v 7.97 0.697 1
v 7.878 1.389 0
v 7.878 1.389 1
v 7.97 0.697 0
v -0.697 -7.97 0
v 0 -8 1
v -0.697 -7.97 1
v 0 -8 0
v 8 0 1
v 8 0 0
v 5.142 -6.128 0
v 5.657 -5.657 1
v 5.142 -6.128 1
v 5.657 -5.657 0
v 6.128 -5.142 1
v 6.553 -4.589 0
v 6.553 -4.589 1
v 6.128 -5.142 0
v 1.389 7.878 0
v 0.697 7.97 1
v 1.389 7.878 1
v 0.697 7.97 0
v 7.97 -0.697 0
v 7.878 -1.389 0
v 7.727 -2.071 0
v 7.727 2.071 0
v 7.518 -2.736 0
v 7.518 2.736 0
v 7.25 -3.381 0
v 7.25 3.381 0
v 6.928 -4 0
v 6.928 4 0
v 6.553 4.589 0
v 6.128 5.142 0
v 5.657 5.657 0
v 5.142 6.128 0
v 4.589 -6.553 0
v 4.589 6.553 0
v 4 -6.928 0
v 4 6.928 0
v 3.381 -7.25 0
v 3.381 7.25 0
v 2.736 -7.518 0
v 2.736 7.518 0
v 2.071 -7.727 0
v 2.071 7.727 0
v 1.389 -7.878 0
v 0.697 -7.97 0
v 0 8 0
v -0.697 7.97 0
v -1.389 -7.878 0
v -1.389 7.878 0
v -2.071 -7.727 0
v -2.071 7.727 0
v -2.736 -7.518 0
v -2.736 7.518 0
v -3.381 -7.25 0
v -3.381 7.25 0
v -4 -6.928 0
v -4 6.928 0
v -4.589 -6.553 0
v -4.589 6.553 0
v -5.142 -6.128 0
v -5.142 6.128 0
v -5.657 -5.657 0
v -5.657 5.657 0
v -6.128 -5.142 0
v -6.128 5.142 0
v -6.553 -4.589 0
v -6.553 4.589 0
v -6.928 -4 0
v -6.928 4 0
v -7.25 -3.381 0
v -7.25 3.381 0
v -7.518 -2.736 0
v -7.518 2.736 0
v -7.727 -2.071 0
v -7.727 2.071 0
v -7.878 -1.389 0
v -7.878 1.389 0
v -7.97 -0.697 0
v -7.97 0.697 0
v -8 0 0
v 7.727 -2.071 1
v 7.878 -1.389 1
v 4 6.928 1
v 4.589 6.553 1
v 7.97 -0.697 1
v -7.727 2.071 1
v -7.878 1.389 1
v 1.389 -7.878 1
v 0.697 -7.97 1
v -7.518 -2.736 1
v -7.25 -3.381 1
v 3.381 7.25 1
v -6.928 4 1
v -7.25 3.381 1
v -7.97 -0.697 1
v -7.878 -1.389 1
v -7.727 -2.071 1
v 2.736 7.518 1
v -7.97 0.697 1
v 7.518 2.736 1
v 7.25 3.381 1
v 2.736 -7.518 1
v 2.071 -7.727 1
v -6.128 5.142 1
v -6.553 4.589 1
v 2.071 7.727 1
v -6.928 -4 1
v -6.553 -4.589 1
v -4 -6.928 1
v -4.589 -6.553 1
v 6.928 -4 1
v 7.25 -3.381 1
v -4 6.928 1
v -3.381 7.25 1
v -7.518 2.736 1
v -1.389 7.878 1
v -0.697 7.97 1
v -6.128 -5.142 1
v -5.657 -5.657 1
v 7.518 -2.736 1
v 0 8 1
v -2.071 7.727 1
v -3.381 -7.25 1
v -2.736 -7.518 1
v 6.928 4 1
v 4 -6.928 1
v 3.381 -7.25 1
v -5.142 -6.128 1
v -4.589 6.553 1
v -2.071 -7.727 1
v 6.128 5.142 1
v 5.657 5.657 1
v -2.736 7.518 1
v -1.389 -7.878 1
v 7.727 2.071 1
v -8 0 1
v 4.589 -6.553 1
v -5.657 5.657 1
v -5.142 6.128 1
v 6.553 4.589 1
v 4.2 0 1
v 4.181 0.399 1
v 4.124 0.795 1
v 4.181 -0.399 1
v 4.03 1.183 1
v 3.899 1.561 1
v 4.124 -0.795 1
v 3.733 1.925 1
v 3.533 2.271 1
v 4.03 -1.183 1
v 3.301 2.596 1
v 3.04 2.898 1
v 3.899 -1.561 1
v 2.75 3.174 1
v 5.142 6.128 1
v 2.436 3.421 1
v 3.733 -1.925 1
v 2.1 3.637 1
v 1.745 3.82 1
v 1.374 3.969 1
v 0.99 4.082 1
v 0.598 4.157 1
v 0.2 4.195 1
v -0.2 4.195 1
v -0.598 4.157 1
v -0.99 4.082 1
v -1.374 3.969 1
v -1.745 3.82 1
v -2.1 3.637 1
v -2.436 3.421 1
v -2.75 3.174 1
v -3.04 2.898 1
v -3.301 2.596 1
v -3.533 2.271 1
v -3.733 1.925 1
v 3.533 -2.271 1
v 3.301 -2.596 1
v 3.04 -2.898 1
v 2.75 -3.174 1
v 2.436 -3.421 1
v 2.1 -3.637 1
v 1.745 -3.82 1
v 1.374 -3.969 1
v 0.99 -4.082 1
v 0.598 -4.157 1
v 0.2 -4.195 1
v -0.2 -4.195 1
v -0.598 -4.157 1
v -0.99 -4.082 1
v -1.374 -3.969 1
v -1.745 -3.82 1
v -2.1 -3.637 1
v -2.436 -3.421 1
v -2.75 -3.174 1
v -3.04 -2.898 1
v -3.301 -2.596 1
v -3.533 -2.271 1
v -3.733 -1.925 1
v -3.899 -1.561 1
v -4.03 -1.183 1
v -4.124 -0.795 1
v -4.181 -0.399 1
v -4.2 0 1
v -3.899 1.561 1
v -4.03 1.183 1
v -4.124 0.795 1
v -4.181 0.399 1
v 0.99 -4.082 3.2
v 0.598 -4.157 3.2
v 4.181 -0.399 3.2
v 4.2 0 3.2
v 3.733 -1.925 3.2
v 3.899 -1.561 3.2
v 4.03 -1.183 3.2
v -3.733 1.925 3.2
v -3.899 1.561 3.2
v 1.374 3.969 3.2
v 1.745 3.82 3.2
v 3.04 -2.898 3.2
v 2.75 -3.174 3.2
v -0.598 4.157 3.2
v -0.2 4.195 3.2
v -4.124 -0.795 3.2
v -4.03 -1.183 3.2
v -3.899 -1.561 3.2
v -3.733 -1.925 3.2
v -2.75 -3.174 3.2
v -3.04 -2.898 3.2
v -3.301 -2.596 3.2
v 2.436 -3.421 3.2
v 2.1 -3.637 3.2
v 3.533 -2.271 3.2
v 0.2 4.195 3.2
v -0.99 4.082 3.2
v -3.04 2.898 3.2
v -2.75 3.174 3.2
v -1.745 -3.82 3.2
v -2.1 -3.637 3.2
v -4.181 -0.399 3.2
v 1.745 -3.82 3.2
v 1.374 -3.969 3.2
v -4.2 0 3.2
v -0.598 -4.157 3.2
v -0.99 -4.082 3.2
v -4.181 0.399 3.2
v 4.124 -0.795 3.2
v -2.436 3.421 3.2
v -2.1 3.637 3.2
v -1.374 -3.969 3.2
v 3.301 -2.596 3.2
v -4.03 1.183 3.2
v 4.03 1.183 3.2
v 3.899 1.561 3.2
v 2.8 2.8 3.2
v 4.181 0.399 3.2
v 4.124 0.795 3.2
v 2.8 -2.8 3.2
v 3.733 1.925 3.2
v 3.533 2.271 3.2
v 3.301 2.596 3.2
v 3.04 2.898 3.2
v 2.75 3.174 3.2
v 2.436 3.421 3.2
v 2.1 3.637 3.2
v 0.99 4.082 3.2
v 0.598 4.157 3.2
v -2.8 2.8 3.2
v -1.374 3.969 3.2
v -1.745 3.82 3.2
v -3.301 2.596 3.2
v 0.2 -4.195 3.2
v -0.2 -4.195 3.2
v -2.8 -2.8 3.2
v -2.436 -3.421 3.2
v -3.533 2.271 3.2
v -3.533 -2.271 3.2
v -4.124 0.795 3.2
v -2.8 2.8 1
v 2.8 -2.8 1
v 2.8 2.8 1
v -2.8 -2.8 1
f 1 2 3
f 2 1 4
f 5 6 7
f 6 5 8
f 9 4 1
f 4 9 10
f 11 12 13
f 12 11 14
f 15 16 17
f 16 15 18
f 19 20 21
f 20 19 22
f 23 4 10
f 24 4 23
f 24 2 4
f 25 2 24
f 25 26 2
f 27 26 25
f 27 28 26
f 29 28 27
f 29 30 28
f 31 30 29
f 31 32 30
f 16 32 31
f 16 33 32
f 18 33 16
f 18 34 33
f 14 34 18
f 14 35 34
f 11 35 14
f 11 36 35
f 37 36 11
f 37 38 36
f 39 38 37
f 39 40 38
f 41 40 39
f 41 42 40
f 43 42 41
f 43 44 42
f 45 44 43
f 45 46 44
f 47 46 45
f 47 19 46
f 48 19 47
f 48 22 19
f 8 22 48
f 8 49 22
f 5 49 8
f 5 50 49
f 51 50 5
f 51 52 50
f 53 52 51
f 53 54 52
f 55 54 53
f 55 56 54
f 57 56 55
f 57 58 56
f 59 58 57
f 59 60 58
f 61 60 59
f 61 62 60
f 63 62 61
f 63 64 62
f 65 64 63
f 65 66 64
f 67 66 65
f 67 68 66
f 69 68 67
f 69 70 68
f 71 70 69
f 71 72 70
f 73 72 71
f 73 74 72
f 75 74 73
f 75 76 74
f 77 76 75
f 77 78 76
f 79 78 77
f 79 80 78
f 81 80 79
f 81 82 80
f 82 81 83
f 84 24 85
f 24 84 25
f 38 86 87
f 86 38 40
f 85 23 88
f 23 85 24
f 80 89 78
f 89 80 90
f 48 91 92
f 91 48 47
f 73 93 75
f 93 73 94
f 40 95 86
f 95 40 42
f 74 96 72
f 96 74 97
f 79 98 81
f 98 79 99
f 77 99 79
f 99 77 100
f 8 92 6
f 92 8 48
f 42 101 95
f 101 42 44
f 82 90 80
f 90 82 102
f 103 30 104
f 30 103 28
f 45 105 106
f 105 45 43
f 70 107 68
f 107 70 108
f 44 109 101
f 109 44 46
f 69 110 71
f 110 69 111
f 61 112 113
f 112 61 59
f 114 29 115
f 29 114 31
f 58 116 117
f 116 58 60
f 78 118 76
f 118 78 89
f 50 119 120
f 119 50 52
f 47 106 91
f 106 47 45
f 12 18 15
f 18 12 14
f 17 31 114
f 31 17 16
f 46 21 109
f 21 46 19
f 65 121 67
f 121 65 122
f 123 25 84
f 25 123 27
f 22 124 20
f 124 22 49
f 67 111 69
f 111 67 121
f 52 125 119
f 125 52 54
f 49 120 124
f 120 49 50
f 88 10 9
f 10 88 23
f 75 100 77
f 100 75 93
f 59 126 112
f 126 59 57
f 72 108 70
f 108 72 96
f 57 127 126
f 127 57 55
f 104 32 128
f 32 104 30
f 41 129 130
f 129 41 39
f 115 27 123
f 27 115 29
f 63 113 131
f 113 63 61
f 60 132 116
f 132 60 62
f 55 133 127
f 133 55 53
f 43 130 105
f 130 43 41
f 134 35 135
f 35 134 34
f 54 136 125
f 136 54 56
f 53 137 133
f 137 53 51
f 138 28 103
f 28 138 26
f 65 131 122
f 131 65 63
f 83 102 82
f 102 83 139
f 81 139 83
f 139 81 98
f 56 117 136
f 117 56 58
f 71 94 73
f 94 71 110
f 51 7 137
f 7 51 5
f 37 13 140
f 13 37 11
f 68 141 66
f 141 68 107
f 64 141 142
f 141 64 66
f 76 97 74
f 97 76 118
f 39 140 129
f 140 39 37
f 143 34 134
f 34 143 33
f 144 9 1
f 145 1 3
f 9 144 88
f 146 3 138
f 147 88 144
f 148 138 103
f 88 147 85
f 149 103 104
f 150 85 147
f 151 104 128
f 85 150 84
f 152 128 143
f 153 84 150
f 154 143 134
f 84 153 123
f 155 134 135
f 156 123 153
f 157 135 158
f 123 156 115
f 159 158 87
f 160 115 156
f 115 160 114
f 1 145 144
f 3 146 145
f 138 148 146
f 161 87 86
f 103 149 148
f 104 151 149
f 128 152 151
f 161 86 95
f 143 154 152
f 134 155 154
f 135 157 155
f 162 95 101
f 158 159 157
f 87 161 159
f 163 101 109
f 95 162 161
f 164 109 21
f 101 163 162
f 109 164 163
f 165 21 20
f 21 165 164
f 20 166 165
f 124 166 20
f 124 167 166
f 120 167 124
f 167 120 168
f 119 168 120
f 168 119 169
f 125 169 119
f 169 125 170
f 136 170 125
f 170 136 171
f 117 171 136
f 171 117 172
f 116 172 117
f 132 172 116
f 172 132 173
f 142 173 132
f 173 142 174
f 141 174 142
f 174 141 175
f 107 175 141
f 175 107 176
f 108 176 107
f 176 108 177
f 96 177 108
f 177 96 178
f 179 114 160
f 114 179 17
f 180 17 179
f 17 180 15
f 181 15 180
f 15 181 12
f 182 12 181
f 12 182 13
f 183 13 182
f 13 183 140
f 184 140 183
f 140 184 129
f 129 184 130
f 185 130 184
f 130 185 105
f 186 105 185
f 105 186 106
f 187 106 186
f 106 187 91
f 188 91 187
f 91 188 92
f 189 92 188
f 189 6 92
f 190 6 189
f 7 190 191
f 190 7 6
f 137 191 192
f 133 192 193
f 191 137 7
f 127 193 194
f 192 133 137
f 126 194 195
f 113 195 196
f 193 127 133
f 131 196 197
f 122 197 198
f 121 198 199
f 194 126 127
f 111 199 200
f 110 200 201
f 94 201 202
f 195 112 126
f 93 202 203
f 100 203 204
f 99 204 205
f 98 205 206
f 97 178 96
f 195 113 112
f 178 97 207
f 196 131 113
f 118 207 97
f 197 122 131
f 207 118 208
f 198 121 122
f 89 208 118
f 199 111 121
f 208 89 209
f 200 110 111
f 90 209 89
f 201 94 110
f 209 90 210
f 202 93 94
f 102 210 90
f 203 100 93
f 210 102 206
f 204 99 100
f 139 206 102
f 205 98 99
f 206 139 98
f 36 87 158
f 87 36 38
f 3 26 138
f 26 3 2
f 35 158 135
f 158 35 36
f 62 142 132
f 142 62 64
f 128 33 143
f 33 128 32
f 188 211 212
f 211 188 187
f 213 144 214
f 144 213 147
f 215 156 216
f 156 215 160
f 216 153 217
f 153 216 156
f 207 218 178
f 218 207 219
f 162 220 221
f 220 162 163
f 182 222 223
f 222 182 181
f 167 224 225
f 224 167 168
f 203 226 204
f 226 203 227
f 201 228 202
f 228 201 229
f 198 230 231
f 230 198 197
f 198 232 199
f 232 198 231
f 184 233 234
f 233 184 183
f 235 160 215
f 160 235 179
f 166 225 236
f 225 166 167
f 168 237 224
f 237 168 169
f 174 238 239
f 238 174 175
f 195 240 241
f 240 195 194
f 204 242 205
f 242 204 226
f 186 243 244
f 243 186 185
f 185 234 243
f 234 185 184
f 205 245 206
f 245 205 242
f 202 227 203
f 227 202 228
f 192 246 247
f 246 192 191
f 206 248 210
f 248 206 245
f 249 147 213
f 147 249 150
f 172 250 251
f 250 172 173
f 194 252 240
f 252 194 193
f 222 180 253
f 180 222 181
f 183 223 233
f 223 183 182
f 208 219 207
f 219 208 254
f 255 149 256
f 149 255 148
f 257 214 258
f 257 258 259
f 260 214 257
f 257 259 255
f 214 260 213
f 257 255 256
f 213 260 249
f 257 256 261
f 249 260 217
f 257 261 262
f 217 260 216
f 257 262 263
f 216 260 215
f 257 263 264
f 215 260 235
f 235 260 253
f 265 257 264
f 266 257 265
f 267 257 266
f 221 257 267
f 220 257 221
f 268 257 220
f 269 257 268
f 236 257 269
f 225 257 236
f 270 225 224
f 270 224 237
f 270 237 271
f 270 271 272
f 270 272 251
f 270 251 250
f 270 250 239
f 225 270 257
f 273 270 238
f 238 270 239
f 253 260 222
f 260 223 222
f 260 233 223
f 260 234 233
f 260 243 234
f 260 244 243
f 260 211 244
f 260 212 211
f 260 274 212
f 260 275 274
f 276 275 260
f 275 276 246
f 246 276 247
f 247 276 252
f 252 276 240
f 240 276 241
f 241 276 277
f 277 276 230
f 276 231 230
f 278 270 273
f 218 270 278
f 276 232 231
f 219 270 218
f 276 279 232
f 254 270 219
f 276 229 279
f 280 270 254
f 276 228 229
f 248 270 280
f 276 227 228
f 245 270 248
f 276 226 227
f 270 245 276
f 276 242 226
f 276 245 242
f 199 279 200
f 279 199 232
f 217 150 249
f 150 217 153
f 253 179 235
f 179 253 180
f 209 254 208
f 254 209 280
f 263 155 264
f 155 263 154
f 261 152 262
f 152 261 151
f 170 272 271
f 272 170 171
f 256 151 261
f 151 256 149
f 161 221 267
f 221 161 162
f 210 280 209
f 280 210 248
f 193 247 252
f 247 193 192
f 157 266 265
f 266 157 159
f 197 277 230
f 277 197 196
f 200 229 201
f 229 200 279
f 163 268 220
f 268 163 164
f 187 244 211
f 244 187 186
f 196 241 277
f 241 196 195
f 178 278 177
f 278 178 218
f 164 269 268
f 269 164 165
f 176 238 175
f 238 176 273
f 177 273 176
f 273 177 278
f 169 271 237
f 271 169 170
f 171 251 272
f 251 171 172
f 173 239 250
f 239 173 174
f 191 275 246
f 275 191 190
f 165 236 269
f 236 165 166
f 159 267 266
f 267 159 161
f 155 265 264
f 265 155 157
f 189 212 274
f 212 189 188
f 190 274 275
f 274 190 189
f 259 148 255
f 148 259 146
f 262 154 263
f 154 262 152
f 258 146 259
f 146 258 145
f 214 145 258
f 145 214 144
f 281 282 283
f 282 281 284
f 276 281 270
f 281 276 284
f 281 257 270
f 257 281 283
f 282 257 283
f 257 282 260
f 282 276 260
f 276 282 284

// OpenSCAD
//$fn=60;
$fa=5;
$fs=.4;

difference(){
    union(){
        linear_extrude(height=1) circle(d=16);
        linear_extrude(height=3.2) circle(d=8.4);
    }
    translate([0,0,1]) linear_extrude(height=5) square([5.6,5.6],center=true);
}
